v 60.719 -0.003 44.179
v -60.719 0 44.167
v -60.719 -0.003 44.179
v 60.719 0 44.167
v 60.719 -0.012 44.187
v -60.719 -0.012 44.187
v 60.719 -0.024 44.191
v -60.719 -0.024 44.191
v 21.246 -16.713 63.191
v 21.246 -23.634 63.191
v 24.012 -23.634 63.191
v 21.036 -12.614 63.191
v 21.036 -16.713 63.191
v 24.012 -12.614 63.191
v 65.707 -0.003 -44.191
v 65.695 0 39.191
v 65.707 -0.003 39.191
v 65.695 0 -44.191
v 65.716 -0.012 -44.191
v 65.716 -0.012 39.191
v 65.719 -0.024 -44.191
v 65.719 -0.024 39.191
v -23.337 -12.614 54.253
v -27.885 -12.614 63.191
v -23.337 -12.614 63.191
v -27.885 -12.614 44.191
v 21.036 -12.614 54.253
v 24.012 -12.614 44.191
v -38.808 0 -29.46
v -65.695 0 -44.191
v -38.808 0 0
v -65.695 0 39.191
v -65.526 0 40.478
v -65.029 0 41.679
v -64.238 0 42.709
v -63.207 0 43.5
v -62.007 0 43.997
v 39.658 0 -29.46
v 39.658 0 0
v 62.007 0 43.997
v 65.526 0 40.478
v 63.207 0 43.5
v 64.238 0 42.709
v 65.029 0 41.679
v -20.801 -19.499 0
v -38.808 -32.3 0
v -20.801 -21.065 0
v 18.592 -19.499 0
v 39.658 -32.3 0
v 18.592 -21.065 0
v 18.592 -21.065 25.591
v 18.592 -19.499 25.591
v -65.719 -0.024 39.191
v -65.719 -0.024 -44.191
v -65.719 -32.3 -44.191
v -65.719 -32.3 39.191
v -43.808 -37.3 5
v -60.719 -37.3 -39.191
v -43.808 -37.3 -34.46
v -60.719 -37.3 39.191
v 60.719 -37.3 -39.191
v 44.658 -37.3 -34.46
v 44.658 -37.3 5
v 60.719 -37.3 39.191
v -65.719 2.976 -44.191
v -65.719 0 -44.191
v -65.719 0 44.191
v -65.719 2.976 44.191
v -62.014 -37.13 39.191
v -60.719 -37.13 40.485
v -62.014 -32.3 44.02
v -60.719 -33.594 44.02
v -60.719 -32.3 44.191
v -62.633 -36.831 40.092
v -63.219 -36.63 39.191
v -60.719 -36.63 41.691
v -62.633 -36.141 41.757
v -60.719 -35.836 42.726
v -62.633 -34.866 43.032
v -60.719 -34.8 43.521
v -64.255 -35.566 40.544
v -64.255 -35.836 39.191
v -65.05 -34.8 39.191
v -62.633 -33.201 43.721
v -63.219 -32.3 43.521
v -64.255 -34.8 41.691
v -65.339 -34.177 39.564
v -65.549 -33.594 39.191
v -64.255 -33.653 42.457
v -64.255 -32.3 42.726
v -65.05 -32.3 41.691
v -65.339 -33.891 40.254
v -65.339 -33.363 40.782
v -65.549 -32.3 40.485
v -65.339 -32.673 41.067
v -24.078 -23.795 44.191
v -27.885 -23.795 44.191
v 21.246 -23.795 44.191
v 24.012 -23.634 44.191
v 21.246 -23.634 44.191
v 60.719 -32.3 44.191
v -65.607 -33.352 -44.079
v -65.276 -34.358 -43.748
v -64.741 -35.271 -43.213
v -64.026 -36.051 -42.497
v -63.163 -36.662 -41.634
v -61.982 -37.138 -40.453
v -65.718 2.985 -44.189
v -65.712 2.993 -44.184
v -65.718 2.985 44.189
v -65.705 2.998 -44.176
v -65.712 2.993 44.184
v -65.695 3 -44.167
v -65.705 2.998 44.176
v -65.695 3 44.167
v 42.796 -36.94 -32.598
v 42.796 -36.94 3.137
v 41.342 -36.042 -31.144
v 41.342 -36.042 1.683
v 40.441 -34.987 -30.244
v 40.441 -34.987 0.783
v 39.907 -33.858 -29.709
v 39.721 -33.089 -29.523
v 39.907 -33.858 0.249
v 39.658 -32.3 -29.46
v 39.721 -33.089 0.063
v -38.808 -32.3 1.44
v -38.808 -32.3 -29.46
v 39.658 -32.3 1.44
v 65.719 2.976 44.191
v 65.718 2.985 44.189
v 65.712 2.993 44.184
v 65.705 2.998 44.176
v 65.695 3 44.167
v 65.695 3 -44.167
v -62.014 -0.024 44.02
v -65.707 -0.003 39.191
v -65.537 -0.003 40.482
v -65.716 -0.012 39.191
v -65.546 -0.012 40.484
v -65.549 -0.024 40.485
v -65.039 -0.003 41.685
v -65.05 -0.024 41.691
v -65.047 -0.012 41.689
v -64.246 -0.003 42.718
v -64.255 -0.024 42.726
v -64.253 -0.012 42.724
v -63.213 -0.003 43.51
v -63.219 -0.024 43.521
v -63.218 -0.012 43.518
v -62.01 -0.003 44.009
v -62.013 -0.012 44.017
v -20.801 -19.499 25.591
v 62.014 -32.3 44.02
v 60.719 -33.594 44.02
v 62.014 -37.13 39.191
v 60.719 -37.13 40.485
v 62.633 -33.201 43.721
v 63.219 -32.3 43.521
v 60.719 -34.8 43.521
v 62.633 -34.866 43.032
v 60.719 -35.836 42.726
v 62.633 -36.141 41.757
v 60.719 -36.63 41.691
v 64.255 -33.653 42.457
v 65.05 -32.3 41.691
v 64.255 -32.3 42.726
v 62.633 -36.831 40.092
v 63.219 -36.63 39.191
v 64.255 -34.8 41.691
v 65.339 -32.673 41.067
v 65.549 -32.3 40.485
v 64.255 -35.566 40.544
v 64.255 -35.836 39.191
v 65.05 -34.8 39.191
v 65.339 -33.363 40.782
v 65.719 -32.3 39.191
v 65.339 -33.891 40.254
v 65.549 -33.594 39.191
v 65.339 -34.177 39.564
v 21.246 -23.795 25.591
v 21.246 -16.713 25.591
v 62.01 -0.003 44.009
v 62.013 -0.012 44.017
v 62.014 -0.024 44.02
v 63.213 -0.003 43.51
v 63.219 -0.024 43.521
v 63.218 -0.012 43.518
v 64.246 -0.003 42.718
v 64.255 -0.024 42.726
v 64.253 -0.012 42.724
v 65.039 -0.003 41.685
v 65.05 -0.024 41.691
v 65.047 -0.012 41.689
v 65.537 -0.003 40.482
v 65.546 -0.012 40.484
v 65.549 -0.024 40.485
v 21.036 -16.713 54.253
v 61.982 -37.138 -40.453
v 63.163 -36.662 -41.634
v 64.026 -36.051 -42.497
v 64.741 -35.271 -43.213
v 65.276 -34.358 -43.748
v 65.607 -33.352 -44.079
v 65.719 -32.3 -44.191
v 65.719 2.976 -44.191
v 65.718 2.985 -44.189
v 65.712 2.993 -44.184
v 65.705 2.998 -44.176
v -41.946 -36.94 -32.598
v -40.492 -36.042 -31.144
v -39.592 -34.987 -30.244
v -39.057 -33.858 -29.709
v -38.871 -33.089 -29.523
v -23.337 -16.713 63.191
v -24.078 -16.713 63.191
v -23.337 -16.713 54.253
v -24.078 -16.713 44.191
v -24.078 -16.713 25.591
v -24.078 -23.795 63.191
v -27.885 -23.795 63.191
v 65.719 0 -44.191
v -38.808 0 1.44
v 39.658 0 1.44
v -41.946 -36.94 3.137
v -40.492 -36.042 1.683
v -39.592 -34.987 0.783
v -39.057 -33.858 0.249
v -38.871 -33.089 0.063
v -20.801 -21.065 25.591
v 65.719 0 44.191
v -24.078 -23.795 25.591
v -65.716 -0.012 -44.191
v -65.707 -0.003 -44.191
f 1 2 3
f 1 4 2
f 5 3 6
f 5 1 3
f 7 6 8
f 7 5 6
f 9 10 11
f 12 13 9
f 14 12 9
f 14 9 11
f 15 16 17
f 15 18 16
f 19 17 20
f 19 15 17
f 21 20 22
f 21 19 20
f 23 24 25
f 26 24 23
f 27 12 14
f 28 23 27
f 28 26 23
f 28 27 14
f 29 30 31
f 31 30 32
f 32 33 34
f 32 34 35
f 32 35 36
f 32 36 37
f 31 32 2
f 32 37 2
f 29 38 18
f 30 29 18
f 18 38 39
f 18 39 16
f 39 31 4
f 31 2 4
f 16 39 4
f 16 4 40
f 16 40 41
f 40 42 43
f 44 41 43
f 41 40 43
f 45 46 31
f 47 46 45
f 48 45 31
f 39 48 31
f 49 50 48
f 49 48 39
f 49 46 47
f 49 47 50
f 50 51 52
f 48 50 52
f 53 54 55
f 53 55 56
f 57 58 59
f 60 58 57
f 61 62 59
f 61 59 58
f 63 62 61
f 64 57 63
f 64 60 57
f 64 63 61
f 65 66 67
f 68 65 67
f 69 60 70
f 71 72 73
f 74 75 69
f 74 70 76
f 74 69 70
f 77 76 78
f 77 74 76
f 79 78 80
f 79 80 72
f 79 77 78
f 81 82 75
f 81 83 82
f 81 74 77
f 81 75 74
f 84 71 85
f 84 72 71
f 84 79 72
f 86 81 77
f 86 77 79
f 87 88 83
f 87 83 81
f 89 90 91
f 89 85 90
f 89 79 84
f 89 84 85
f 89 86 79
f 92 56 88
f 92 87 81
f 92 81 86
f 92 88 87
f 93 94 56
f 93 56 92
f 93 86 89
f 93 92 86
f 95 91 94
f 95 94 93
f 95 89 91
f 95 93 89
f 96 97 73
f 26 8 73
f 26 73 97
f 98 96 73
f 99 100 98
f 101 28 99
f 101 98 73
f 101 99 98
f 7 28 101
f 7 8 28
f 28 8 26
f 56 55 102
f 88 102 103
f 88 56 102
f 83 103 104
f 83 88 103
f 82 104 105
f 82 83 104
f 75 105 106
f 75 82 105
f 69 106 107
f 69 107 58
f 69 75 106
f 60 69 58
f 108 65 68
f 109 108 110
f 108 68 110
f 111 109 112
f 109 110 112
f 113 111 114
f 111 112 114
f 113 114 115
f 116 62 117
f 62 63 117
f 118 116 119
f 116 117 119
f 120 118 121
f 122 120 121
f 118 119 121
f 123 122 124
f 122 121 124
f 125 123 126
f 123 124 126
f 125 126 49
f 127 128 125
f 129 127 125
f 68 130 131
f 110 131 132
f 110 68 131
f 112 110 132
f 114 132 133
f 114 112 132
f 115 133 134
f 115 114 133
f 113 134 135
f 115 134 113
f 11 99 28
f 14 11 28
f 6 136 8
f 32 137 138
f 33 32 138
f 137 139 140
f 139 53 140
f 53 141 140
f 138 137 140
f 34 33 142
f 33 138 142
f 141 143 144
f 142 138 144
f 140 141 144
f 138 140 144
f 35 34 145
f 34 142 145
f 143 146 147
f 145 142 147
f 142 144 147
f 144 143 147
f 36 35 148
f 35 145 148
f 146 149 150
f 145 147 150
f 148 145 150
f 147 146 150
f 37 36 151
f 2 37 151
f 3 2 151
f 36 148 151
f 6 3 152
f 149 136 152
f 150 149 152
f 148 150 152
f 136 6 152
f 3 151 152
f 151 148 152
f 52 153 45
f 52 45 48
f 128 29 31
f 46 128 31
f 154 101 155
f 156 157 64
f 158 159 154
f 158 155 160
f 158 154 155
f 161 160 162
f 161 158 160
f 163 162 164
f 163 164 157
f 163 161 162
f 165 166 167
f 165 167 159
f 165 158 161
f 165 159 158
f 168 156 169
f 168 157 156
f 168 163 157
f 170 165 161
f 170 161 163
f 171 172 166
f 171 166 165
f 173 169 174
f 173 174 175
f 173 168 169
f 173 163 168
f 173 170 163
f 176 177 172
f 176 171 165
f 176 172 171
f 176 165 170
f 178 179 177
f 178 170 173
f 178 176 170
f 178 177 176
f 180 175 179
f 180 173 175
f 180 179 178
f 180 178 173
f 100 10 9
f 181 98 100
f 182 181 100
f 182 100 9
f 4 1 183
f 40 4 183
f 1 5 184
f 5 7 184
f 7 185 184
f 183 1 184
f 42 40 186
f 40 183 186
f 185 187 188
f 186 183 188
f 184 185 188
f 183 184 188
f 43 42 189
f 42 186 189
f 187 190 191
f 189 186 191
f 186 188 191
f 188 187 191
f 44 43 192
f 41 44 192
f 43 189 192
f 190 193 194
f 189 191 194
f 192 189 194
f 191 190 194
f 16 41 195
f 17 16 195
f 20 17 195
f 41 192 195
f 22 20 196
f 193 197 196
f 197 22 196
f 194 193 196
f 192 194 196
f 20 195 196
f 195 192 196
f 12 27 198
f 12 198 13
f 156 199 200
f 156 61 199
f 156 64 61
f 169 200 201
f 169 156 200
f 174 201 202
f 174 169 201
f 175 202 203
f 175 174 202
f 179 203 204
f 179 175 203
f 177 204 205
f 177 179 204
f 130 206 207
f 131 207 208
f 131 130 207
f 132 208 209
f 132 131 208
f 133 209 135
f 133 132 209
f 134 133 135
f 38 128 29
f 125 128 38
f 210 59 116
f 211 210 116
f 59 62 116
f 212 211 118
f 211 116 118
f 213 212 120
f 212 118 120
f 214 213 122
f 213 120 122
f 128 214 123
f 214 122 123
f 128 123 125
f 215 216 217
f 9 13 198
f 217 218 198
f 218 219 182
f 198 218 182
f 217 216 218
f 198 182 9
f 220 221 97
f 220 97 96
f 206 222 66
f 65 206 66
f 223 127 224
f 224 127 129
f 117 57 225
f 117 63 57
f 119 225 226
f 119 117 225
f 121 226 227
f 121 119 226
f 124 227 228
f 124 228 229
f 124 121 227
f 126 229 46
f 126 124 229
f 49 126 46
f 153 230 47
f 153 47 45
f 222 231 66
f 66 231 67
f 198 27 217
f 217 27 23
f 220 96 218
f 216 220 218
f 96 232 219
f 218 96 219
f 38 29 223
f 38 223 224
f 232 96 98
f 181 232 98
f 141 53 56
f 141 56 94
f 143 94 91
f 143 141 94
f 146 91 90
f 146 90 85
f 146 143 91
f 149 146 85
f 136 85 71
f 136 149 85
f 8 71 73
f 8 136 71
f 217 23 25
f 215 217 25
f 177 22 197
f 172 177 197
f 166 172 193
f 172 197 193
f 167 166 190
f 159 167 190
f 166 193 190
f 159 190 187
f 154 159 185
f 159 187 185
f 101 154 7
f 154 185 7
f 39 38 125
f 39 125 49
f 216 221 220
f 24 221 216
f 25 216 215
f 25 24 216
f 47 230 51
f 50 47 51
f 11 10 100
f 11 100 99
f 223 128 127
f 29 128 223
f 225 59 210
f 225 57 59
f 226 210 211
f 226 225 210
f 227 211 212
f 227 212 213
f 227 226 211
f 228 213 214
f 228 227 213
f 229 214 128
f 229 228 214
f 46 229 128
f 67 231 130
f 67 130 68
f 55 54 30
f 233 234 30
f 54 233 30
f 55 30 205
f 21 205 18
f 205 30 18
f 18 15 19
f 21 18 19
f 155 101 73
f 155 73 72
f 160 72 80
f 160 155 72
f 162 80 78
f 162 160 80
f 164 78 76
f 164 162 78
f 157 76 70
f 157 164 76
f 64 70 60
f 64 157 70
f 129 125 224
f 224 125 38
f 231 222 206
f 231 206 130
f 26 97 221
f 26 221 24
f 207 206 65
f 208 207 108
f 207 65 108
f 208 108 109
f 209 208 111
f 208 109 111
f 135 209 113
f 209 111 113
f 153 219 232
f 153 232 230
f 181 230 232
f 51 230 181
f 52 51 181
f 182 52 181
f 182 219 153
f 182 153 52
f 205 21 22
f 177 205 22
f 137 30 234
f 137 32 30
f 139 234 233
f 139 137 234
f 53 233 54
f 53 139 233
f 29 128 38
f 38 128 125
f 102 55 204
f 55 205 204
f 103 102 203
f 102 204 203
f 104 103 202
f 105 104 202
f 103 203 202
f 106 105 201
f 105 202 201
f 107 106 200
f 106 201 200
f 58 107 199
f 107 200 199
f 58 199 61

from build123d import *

# Parameters (mm, degrees)
F0_W          = 131.4388513565
F0_H          = 88.3812978864
F1_DEPTH      = 37.3
F2_W          = 78.4667283297
F2_H          = 29.4604320079
F3_DEPTH      = 61.4
F4_R          = 5
F5_W          = 131.4388513565
F5_H          = 88.3812978864
F6_DEPTH      = 3
F7_W          = 45.3237425536
F7_H          = 7.0818327367
F8_DEPTH      = 18.6
F9_W          = 39.392977953
F9_H          = 1.5654563904
F10_DEPTH     = 50.6
F11_T1_DEPTH  = 44.8
F11_S5_W      = 5
F11_S5_H      = 5
F11_T6_DEPTH  = 5
F11_S11_W     = 5
F11_S11_H     = 5
F11_T12_DEPTH = 5
F12_R         = 0.0241421356
F12_2_R       = 0.0241421356
F13_W         = 45.3237425536
F13_H         = 4.0992423892
F14_DEPTH     = 19
F15_W         = 3.8063414395
F15_H         = 11.1810751259
F16_DEPTH     = 19
F17_W         = 2.7666892856
F17_H         = 11.0205691308
F18_DEPTH     = 19
F19_W         = 44.3728975952
F19_H         = 8.9377077818
F20_DEPTH     = 25
F21_DEPTH     = 30.9


# Not quite as in the source:
# - a fillet or chamfer that OpenCascade refuses, or shapes differently, is made with other operations: its cross-section is extruded or revolved along the edge and cut away or added


with BuildPart() as f1:
    # F0 (on Front) → F1 (new body)
    with BuildSketch(Plane.XZ):
        Rectangle(F0_W, F0_H)
    extrude(amount=F1_DEPTH)

    # F2 (on face) → F3 (cut)
    with BuildSketch(Plane.XZ.offset(37.3)):
        with Locations((0.4249103367, -14.730216004)):
            Rectangle(F2_W, F2_H)
    extrude(amount=-F3_DEPTH, mode=Mode.SUBTRACT)

    # F4
    f4_edges = [f1.edges().sort_by_distance(p)[0] for p in [
        (0, -37.3, -44.190649),
        (-65.719426, -37.3, 0),
        (65.719426, -37.3, 0),
        (0, -37.3, 44.190649),
        (0.42491, -37.3, 0),
        (-38.808454, -37.3, -14.730216),
        (0.42491, -37.3, -29.460432),
        (39.658275, -37.3, -14.730216),
    ]]
    fillet(f4_edges, radius=F4_R)

    # F7 (on face) → F8 (cut)
    with BuildSketch(Plane.XY.offset(44.1906489432)):
        with Locations((-1.4163674787, -20.2540475875)):
            Rectangle(F7_W, F7_H)
    extrude(amount=-F8_DEPTH, mode=Mode.SUBTRACT)

    # F9 (on face) → F10 (cut)
    with BuildSketch(Plane.XY.offset(25.5906489432)):
        with Locations((-1.1046566069, -20.2819518745)):
            Rectangle(F9_W, F9_H)
    extrude(amount=-F10_DEPTH, mode=Mode.SUBTRACT)

    # F11: fillet of radius 5 on 2 edges, made by hand

    # F11_s2 → F11_t1 (cut)
    with BuildSketch(Plane.XZ.offset(-12.5)):
        with BuildLine():
            ThreePointArc((65.7194256783, 39.1906489432), (64.2549595842, 42.7261828491), (60.7194256783, 44.1906489432))
            Line((60.7194256783, 44.1906489432), (65.7194256783, 44.1906489432))
            Line((65.7194256783, 44.1906489432), (65.7194256783, 39.1906489432))
        make_face()
        with BuildLine():
            ThreePointArc((-65.7194256783, 39.1906489432), (-64.2549595842, 42.7261828491), (-60.7194256783, 44.1906489432))
            Line((-60.7194256783, 44.1906489432), (-65.7194256783, 44.1906489432))
            Line((-65.7194256783, 44.1906489432), (-65.7194256783, 39.1906489432))
        make_face()
    extrude(amount=F11_T1_DEPTH, mode=Mode.SUBTRACT)


with BuildPart() as f6:
    # F5 (on face) → F6 (new body)
    with BuildSketch(Plane(origin=(0, 0, 0), x_dir=(-1, 0, 0), z_dir=(0, 1, 0))):
        Rectangle(F5_W, F5_H)
    extrude(amount=F6_DEPTH)

    # F12
    f12_edges = [f6.edges().sort_by_distance(p)[0] for p in [
        (-65.719426, 3, 0),
        (0, 3, 44.190649),
        (65.719426, 3, 0),
        (0, 3, -44.190649),
    ]]
    fillet(f12_edges, radius=F12_R)


with BuildPart() as f11_tool4:
    # F11_s5 → F11_t6 (new body)
    with BuildSketch(Plane.YZ.offset(-60.7194256783)):
        with Locations((-34.8, 41.6906489432)):
            Rectangle(F11_S5_W, F11_S5_H)
    extrude(amount=-F11_T6_DEPTH)

    # F11_s7 → F11_t8 (revolve, cut)
    with BuildSketch(Plane(origin=(-60.7194256783, -32.3, 39.1906489432), x_dir=(0, 0.7071067812, -0.7071067812), z_dir=(0, 0.7071067812, 0.7071067812))):
        with BuildLine():
            ThreePointArc((0, -5), (5, 0), (0, 5))
            Line((0, 5), (0, -5))
        make_face()
    revolve(axis=Axis((-60.7194256783, -32.3, 39.1906489432), (-1, 0, 0)), mode=Mode.SUBTRACT)


with BuildPart() as f1_1:
    add(f1.part)

    # F11_t3: cut F11_tool4
    add(f11_tool4.part, mode=Mode.SUBTRACT)


with BuildPart() as f11_tool10:
    # F11_s11 → F11_t12 (new body)
    with BuildSketch(Plane.YZ.offset(60.7194256783)):
        with Locations((-34.8, 41.6906489432)):
            Rectangle(F11_S11_W, F11_S11_H)
    extrude(amount=F11_T12_DEPTH)

    # F11_s13 → F11_t14 (revolve, cut)
    with BuildSketch(Plane(origin=(60.7194256783, -32.3, 39.1906489432), x_dir=(0, 0.7071067812, -0.7071067812), z_dir=(0, -0.7071067812, -0.7071067812))):
        with BuildLine():
            ThreePointArc((0, -5), (5, 0), (0, 5))
            Line((0, 5), (0, -5))
        make_face()
    revolve(axis=Axis((60.7194256783, -32.3, 39.1906489432), (1, 0, 0)), mode=Mode.SUBTRACT)


with BuildPart() as f1_2:
    add(f1_1.part)

    # F11_t9: cut F11_tool10
    add(f11_tool10.part, mode=Mode.SUBTRACT)

    # F12#2
    f12_2_edges = [f1_2.edges().sort_by_distance(p)[0] for p in [
        (64.25496, 0, 42.726183),
        (-64.25496, 0, 42.726183),
    ]]
    fillet(f12_2_edges, radius=F12_2_R)

    # F13 (on face) → F14 (join)
    with BuildSketch(Plane.XY.offset(44.1906489432)):
        with Locations((-1.4163674787, -14.6635100245)):
            Rectangle(F13_W, F13_H)
    extrude(amount=F14_DEPTH)

    # F15 (on face) → F16 (join)
    with BuildSketch(Plane.XY.offset(44.1906489432)):
        with Locations((-25.9814094752, -18.2044263929)):
            Rectangle(F15_W, F15_H)
    extrude(amount=F16_DEPTH)

    # F17 (on face) → F18 (join)
    with BuildSketch(Plane.XY.offset(44.1906489432)):
        with Locations((22.6288484409, -18.1241733953)):
            Rectangle(F17_W, F17_H)
    extrude(amount=F18_DEPTH)

    # F19 (on face) → F20 (cut)
    with BuildSketch(Plane(origin=(0, -12.6138888299, 0), x_dir=(-1, 0, 0), z_dir=(0, 1, 0))):
        with Locations((1.1502206326, 58.7217950523)):
            Rectangle(F19_W, F19_H)
    extrude(amount=-F20_DEPTH, mode=Mode.SUBTRACT)


with BuildPart() as f21:
    # F21 (new): a face of the model
    f21_faces = [f1_2.part.faces().sort_by_distance(p)[0] for p in [
        (0.4249103367, -16.15, -29.4604320079),
    ]]
    extrude(f21_faces, amount=F21_DEPTH)


solid = Compound([f6.part, f1_2.part, f21.part])
